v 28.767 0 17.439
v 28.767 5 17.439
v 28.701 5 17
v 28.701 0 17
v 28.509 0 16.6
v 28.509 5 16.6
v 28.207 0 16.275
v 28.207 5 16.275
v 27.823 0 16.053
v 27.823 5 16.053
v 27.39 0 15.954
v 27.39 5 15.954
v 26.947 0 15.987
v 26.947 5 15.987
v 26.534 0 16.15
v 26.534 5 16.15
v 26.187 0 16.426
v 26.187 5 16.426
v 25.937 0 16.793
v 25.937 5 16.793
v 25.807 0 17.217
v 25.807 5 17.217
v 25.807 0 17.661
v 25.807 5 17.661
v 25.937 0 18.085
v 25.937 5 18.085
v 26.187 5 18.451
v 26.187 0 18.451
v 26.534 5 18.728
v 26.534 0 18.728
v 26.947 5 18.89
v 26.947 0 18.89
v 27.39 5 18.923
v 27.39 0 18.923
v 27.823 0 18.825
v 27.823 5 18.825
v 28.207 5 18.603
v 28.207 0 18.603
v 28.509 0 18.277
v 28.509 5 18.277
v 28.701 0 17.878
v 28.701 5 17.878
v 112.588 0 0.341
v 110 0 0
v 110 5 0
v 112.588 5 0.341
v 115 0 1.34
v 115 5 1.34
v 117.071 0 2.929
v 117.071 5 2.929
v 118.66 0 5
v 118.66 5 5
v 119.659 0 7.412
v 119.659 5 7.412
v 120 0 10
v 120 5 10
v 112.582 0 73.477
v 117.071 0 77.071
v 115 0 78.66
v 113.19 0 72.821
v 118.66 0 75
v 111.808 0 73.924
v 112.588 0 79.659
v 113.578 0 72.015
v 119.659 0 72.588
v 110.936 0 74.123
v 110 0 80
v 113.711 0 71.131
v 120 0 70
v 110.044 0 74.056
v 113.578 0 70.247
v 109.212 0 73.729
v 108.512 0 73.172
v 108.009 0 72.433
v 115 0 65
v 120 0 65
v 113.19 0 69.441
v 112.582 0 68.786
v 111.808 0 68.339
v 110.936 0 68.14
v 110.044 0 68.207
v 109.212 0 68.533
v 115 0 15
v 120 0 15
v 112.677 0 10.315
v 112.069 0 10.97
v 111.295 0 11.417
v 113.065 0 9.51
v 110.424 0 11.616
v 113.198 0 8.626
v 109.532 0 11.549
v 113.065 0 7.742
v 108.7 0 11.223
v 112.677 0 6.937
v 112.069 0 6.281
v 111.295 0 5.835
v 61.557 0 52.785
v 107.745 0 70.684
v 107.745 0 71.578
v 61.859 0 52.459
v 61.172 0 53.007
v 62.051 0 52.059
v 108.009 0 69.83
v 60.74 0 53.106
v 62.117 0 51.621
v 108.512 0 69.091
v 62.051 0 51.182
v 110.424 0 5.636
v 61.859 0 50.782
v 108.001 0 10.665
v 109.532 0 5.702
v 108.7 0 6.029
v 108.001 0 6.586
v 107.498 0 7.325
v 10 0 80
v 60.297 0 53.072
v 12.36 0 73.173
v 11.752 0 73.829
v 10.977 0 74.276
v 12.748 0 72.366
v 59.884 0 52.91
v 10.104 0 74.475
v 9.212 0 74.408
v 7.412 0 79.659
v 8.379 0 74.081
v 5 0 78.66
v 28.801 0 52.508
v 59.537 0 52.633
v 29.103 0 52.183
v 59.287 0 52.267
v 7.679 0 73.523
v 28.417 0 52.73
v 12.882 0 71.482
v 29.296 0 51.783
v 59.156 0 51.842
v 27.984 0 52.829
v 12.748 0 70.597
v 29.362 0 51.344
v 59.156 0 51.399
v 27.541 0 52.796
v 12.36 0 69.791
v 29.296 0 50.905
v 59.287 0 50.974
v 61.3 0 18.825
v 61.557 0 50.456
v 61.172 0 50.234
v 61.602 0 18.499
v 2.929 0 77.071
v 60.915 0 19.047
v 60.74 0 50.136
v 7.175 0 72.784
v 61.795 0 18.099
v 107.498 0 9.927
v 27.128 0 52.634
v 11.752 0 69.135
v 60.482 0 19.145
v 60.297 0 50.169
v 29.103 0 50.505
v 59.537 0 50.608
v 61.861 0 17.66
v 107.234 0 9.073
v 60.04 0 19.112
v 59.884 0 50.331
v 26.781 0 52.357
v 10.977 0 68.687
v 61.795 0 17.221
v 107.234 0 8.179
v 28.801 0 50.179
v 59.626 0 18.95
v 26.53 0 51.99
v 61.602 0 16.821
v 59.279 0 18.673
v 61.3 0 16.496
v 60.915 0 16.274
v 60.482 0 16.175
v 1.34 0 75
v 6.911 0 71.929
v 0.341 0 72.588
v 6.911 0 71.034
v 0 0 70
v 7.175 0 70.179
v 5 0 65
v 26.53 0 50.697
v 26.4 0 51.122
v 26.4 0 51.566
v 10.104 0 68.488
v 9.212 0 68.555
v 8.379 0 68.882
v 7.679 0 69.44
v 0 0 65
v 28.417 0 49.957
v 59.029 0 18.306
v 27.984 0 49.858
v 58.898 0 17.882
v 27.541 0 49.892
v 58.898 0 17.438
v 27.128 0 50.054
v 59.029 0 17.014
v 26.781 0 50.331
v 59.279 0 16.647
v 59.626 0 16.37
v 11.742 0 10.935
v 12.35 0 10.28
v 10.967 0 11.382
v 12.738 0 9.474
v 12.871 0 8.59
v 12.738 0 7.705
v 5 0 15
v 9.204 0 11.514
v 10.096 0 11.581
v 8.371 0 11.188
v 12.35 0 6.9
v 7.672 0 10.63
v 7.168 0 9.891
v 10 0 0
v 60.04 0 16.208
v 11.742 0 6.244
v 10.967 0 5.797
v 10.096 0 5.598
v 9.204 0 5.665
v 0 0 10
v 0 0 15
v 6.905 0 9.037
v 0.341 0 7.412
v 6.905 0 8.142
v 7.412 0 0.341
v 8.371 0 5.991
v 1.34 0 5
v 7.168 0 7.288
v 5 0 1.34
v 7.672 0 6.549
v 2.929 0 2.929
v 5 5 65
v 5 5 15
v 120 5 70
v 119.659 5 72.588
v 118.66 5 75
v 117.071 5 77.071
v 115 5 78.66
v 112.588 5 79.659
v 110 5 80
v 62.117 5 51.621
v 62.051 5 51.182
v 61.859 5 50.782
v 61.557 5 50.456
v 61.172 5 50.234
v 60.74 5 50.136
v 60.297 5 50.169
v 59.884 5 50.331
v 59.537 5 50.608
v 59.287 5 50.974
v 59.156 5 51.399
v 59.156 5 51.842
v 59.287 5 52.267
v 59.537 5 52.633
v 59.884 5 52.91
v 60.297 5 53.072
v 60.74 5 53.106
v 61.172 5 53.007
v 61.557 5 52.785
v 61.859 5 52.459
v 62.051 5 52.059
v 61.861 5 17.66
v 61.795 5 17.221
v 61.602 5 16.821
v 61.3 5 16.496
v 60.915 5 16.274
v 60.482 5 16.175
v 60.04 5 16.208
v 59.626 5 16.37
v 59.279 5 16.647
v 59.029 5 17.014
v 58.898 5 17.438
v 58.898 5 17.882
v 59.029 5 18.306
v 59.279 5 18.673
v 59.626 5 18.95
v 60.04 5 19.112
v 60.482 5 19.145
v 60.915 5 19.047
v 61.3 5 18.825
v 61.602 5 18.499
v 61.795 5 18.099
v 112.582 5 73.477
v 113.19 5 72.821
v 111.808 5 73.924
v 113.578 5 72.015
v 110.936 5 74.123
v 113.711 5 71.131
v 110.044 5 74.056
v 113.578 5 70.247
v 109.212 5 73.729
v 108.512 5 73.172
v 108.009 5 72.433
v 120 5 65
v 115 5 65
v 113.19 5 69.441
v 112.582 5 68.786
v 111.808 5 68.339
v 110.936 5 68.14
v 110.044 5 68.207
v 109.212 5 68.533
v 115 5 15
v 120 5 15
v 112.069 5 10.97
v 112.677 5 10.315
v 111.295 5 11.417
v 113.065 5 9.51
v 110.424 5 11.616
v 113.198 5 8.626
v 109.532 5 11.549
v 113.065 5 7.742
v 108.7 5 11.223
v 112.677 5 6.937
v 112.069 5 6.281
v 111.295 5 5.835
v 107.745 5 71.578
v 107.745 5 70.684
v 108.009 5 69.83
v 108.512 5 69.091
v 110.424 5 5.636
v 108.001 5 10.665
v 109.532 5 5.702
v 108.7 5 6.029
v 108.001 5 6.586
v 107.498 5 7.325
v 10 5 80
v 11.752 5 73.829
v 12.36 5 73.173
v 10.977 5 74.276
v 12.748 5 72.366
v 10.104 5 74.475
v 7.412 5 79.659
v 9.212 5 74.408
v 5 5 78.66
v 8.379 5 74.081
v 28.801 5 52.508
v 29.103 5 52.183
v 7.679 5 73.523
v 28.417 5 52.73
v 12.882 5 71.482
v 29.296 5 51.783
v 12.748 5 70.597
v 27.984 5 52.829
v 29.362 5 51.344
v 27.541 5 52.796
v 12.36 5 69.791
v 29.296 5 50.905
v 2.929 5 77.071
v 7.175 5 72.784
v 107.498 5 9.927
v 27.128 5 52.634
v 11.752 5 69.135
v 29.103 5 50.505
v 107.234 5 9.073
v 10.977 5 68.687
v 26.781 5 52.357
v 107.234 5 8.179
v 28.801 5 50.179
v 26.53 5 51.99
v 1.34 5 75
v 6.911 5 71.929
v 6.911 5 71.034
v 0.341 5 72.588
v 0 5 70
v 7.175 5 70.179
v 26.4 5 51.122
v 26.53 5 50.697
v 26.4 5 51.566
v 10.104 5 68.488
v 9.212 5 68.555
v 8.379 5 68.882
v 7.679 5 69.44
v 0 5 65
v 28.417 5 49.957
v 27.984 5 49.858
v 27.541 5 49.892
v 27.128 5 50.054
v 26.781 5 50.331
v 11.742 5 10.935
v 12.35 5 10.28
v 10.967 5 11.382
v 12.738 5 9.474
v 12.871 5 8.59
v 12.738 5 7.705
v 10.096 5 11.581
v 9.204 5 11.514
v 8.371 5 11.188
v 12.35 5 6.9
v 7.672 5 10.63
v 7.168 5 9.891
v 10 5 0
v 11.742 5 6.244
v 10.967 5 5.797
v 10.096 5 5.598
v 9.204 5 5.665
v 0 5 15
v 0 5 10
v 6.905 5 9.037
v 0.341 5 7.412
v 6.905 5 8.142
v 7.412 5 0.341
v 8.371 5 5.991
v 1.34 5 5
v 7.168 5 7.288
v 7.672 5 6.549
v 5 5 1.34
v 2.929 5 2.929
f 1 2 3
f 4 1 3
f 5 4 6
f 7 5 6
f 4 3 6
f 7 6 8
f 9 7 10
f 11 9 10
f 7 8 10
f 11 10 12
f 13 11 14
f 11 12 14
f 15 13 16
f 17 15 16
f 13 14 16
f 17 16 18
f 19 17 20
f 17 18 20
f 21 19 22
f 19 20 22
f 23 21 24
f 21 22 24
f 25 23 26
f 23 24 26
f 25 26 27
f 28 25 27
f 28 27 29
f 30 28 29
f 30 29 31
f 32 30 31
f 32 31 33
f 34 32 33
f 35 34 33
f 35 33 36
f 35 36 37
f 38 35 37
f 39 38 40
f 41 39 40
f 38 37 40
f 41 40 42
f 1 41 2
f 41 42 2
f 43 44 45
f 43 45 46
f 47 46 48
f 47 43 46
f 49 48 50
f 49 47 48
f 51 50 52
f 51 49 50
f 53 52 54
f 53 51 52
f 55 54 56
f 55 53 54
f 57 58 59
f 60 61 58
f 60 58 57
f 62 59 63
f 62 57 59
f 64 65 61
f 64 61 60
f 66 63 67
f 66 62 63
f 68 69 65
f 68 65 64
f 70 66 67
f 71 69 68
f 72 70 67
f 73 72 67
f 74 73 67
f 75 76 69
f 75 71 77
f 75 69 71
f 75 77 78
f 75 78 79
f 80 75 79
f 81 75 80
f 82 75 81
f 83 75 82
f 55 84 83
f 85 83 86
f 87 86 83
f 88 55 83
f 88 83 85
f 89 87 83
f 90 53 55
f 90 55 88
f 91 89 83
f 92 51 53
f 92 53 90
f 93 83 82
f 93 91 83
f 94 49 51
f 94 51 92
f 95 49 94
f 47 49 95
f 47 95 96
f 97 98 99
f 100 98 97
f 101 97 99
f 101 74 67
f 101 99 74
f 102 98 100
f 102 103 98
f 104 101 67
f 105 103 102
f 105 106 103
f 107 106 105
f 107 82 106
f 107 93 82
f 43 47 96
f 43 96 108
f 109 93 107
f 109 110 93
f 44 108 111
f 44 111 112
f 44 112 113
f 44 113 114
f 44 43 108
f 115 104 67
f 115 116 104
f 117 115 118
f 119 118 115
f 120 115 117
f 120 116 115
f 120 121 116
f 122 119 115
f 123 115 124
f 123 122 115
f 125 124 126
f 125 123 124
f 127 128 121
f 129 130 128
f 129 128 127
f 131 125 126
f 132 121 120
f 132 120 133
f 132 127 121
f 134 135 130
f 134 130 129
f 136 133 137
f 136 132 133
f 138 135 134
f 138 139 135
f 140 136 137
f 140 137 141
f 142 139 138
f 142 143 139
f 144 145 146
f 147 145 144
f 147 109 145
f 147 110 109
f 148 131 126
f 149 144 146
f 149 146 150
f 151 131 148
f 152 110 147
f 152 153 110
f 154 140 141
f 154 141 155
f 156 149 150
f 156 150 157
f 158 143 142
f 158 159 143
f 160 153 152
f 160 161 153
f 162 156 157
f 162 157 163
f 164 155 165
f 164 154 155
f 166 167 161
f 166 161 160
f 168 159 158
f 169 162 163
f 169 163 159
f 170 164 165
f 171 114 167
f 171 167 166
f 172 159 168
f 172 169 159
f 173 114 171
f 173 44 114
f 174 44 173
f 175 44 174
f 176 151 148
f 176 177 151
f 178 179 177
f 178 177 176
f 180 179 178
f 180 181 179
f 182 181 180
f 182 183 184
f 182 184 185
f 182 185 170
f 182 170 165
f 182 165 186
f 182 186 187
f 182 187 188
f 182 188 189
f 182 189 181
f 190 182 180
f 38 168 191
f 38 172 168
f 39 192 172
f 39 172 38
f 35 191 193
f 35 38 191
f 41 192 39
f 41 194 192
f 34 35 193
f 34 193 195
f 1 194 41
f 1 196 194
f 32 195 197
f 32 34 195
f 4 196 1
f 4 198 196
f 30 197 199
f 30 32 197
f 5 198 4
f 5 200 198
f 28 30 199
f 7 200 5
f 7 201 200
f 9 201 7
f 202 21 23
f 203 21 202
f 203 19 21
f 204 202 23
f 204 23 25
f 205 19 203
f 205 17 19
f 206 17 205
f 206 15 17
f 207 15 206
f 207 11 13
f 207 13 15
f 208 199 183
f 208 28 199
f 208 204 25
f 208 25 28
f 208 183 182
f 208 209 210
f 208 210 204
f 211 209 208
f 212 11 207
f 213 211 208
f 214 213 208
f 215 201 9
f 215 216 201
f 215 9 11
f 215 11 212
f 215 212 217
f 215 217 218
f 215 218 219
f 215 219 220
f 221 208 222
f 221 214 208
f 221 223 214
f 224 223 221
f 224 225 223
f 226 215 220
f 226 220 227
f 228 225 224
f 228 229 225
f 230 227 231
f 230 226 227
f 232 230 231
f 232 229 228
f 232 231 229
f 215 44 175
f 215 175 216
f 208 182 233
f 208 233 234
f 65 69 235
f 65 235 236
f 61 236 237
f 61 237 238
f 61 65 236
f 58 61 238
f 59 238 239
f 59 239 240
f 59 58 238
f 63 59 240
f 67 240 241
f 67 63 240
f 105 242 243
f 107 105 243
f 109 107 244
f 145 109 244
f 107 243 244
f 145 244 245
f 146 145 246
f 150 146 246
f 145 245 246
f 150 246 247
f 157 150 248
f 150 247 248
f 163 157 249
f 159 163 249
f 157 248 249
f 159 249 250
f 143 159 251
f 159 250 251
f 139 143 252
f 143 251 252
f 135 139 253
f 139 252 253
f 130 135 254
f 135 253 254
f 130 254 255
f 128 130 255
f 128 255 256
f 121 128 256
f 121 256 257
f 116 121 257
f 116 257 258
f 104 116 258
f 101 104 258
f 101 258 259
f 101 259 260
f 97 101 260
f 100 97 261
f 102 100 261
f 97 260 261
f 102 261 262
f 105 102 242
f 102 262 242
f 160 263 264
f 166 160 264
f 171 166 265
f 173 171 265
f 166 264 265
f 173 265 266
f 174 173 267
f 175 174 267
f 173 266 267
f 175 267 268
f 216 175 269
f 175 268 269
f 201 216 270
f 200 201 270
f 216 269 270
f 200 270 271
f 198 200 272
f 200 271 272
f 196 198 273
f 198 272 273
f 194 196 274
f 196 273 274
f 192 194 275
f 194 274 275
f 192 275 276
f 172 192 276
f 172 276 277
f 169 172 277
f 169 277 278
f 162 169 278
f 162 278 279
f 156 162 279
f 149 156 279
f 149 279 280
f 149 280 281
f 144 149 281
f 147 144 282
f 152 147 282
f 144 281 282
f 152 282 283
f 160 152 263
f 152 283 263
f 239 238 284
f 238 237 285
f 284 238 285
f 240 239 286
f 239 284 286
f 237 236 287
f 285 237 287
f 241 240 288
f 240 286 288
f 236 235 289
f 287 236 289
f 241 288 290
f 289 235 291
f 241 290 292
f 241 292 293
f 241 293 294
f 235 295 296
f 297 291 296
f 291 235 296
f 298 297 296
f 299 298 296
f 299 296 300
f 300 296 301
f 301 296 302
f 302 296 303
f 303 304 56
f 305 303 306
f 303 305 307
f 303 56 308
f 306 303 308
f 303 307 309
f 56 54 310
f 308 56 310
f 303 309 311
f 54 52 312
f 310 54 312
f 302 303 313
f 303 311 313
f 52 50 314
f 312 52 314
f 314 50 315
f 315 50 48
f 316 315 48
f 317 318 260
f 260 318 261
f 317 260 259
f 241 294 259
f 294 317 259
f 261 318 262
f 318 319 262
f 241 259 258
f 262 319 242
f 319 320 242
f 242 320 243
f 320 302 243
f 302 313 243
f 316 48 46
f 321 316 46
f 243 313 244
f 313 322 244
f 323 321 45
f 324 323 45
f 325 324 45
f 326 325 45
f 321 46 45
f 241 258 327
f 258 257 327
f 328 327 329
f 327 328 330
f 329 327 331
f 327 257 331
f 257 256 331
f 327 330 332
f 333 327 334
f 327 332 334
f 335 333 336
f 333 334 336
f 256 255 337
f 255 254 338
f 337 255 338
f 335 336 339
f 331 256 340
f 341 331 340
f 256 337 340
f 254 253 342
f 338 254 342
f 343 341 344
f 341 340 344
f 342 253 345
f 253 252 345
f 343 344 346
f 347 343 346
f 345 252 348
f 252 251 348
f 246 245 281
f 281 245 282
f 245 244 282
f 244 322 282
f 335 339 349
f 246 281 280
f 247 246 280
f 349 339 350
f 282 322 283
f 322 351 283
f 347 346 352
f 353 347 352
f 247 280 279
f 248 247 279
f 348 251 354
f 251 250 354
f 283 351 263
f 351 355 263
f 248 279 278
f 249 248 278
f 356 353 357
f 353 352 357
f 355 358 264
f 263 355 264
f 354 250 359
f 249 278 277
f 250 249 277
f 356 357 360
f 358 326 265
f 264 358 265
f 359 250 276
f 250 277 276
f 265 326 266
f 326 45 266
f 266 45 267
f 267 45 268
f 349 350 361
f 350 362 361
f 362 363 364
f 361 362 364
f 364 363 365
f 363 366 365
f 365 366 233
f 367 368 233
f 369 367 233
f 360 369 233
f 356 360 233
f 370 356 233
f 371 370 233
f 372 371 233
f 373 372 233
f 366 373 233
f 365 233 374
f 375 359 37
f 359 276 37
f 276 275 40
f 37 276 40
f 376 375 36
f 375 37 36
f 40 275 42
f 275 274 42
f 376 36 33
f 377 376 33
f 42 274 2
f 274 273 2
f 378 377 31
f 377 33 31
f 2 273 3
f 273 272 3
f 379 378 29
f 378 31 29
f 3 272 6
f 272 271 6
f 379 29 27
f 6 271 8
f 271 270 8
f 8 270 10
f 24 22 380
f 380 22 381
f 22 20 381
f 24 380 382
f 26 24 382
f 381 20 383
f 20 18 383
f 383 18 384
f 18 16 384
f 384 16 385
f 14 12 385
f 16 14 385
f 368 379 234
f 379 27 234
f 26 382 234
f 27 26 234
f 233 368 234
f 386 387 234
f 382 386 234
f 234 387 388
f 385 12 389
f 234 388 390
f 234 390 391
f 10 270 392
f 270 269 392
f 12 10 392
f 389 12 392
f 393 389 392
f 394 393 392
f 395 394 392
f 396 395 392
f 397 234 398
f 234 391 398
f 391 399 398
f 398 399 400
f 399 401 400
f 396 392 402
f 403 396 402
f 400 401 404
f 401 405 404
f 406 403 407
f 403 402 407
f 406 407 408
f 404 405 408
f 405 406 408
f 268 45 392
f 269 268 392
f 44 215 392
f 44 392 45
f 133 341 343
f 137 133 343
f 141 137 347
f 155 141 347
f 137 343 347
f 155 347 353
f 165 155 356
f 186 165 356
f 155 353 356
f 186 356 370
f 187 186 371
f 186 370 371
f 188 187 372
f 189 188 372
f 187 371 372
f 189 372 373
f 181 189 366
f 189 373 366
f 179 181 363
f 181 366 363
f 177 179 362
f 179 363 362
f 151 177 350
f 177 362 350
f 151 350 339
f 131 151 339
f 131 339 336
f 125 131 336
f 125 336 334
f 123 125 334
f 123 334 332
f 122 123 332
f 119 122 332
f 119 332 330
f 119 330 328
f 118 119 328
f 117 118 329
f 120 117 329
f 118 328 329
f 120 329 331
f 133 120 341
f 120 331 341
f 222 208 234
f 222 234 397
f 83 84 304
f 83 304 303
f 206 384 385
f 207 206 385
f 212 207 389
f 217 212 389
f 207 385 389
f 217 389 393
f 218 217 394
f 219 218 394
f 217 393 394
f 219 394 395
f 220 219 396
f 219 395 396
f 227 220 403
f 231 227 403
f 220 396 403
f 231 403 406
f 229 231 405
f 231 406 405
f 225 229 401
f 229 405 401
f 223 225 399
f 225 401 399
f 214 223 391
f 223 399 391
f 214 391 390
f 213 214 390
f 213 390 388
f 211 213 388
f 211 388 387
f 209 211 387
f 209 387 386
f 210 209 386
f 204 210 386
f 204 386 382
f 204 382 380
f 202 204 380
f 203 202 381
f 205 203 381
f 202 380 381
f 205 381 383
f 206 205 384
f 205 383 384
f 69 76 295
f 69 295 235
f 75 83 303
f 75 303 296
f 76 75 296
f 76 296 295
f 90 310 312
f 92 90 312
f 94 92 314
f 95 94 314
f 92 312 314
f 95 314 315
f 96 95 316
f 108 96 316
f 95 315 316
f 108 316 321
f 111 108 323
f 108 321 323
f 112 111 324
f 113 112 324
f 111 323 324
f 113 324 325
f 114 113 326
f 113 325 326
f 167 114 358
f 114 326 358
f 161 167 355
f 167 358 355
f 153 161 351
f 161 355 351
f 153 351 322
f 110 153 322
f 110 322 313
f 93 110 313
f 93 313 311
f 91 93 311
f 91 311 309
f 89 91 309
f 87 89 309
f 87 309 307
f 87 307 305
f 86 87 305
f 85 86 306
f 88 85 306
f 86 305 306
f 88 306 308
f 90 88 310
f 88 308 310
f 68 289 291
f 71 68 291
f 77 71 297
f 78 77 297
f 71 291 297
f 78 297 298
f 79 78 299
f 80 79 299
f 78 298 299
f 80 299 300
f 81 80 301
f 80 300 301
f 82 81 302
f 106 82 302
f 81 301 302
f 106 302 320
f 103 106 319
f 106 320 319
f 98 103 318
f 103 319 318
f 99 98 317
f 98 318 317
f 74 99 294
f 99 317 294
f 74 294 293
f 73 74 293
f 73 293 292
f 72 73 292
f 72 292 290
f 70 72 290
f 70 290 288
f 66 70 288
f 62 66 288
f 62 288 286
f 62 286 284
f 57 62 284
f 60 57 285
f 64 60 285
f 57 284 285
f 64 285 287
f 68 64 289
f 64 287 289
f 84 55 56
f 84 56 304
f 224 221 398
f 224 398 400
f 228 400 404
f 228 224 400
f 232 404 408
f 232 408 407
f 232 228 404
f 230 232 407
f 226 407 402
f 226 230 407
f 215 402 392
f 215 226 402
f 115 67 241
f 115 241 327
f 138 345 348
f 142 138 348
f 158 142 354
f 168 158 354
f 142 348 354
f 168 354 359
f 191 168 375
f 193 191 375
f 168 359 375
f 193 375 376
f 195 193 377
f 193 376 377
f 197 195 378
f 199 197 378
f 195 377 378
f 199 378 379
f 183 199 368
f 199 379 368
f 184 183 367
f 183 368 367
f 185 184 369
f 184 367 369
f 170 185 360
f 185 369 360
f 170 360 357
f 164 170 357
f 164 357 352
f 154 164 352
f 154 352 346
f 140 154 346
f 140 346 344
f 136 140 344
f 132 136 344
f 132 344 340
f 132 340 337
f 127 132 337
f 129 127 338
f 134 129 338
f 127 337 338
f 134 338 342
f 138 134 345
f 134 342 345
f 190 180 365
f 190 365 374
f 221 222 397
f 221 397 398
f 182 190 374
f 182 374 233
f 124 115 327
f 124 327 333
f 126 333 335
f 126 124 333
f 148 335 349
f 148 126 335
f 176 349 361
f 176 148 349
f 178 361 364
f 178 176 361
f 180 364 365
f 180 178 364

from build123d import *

# Parameters (mm, degrees)
BOSS_EXTRUDE1_DEPTH = 5
SKETCH2_R           = 3
SKETCH2_R_2         = 3.002001364
SKETCH2_R_3         = 2.999925667
SKETCH2_R_4         = 2.998527559
CUT_EXTRUDE2_DEPTH  = 5
SKETCH14_R          = 1.488706827
SKETCH14_R_2        = 1.489546346
SKETCH14_R_3        = 1.489389331
SKETCH14_R_4        = 1.489192683
CUT_EXTRUDE3_DEPTH  = 5


with BuildPart() as part:
    # Sketch1 → Boss-Extrude1 (new body)
    with BuildSketch(Plane(origin=(0, 0, 0), x_dir=(1, 0, 0), z_dir=(0, 1, 0))):
        with BuildLine():
            Line((10, 0), (110, 0))
            ThreePointArc((110, 0), (117.071067812, -2.928932188), (120, -10))
            Line((120, -10), (120, -15))
            Line((120, -15), (115, -15))
            Line((115, -15), (115, -65))
            Line((115, -65), (120, -65))
            Line((120, -65), (120, -70))
            ThreePointArc((120, -70), (117.071067812, -77.071067812), (110, -80))
            Line((110, -80), (10, -80))
            ThreePointArc((10, -80), (2.928932188, -77.071067812), (0, -70))
            Line((0, -70), (0, -65))
            Line((0, -65), (5, -65))
            Line((5, -65), (5, -15))
            Line((5, -15), (0, -15))
            Line((0, -15), (0, -10))
            ThreePointArc((0, -10), (2.928932188, -2.928932188), (10, 0))
        make_face()
    extrude(amount=BOSS_EXTRUDE1_DEPTH)

    # Sketch2 → Cut-Extrude2 (cut)
    with BuildSketch(Plane(origin=(0, 5, 0), x_dir=(1, 0, 0), z_dir=(0, 1, 0))):
        with Locations((9.871405569, -8.58955783)):
            Circle(SKETCH2_R)
        with Locations((9.87978839, -71.481609293)):
            Circle(SKETCH2_R_2)
        with Locations((110.711521692, -71.131223036)):
            Circle(SKETCH2_R_3)
        with Locations((110.199519212, -8.625779617)):
            Circle(SKETCH2_R_4)
    extrude(amount=-CUT_EXTRUDE2_DEPTH, mode=Mode.SUBTRACT)

    # Sketch14 → Cut-Extrude3 (cut)
    with BuildSketch(Plane(origin=(0, 5, 0), x_dir=(1, 0, 0), z_dir=(0, 1, 0))):
        with Locations((27.278668434, -17.438830443)):
            Circle(SKETCH14_R)
        with Locations((60.371161684, -17.660103474)):
            Circle(SKETCH14_R_2)
        with Locations((27.872388447, -51.343688287)):
            Circle(SKETCH14_R_3)
        with Locations((60.628260138, -51.620538185)):
            Circle(SKETCH14_R_4)
    extrude(amount=-CUT_EXTRUDE3_DEPTH, mode=Mode.SUBTRACT)


solid = part.part
